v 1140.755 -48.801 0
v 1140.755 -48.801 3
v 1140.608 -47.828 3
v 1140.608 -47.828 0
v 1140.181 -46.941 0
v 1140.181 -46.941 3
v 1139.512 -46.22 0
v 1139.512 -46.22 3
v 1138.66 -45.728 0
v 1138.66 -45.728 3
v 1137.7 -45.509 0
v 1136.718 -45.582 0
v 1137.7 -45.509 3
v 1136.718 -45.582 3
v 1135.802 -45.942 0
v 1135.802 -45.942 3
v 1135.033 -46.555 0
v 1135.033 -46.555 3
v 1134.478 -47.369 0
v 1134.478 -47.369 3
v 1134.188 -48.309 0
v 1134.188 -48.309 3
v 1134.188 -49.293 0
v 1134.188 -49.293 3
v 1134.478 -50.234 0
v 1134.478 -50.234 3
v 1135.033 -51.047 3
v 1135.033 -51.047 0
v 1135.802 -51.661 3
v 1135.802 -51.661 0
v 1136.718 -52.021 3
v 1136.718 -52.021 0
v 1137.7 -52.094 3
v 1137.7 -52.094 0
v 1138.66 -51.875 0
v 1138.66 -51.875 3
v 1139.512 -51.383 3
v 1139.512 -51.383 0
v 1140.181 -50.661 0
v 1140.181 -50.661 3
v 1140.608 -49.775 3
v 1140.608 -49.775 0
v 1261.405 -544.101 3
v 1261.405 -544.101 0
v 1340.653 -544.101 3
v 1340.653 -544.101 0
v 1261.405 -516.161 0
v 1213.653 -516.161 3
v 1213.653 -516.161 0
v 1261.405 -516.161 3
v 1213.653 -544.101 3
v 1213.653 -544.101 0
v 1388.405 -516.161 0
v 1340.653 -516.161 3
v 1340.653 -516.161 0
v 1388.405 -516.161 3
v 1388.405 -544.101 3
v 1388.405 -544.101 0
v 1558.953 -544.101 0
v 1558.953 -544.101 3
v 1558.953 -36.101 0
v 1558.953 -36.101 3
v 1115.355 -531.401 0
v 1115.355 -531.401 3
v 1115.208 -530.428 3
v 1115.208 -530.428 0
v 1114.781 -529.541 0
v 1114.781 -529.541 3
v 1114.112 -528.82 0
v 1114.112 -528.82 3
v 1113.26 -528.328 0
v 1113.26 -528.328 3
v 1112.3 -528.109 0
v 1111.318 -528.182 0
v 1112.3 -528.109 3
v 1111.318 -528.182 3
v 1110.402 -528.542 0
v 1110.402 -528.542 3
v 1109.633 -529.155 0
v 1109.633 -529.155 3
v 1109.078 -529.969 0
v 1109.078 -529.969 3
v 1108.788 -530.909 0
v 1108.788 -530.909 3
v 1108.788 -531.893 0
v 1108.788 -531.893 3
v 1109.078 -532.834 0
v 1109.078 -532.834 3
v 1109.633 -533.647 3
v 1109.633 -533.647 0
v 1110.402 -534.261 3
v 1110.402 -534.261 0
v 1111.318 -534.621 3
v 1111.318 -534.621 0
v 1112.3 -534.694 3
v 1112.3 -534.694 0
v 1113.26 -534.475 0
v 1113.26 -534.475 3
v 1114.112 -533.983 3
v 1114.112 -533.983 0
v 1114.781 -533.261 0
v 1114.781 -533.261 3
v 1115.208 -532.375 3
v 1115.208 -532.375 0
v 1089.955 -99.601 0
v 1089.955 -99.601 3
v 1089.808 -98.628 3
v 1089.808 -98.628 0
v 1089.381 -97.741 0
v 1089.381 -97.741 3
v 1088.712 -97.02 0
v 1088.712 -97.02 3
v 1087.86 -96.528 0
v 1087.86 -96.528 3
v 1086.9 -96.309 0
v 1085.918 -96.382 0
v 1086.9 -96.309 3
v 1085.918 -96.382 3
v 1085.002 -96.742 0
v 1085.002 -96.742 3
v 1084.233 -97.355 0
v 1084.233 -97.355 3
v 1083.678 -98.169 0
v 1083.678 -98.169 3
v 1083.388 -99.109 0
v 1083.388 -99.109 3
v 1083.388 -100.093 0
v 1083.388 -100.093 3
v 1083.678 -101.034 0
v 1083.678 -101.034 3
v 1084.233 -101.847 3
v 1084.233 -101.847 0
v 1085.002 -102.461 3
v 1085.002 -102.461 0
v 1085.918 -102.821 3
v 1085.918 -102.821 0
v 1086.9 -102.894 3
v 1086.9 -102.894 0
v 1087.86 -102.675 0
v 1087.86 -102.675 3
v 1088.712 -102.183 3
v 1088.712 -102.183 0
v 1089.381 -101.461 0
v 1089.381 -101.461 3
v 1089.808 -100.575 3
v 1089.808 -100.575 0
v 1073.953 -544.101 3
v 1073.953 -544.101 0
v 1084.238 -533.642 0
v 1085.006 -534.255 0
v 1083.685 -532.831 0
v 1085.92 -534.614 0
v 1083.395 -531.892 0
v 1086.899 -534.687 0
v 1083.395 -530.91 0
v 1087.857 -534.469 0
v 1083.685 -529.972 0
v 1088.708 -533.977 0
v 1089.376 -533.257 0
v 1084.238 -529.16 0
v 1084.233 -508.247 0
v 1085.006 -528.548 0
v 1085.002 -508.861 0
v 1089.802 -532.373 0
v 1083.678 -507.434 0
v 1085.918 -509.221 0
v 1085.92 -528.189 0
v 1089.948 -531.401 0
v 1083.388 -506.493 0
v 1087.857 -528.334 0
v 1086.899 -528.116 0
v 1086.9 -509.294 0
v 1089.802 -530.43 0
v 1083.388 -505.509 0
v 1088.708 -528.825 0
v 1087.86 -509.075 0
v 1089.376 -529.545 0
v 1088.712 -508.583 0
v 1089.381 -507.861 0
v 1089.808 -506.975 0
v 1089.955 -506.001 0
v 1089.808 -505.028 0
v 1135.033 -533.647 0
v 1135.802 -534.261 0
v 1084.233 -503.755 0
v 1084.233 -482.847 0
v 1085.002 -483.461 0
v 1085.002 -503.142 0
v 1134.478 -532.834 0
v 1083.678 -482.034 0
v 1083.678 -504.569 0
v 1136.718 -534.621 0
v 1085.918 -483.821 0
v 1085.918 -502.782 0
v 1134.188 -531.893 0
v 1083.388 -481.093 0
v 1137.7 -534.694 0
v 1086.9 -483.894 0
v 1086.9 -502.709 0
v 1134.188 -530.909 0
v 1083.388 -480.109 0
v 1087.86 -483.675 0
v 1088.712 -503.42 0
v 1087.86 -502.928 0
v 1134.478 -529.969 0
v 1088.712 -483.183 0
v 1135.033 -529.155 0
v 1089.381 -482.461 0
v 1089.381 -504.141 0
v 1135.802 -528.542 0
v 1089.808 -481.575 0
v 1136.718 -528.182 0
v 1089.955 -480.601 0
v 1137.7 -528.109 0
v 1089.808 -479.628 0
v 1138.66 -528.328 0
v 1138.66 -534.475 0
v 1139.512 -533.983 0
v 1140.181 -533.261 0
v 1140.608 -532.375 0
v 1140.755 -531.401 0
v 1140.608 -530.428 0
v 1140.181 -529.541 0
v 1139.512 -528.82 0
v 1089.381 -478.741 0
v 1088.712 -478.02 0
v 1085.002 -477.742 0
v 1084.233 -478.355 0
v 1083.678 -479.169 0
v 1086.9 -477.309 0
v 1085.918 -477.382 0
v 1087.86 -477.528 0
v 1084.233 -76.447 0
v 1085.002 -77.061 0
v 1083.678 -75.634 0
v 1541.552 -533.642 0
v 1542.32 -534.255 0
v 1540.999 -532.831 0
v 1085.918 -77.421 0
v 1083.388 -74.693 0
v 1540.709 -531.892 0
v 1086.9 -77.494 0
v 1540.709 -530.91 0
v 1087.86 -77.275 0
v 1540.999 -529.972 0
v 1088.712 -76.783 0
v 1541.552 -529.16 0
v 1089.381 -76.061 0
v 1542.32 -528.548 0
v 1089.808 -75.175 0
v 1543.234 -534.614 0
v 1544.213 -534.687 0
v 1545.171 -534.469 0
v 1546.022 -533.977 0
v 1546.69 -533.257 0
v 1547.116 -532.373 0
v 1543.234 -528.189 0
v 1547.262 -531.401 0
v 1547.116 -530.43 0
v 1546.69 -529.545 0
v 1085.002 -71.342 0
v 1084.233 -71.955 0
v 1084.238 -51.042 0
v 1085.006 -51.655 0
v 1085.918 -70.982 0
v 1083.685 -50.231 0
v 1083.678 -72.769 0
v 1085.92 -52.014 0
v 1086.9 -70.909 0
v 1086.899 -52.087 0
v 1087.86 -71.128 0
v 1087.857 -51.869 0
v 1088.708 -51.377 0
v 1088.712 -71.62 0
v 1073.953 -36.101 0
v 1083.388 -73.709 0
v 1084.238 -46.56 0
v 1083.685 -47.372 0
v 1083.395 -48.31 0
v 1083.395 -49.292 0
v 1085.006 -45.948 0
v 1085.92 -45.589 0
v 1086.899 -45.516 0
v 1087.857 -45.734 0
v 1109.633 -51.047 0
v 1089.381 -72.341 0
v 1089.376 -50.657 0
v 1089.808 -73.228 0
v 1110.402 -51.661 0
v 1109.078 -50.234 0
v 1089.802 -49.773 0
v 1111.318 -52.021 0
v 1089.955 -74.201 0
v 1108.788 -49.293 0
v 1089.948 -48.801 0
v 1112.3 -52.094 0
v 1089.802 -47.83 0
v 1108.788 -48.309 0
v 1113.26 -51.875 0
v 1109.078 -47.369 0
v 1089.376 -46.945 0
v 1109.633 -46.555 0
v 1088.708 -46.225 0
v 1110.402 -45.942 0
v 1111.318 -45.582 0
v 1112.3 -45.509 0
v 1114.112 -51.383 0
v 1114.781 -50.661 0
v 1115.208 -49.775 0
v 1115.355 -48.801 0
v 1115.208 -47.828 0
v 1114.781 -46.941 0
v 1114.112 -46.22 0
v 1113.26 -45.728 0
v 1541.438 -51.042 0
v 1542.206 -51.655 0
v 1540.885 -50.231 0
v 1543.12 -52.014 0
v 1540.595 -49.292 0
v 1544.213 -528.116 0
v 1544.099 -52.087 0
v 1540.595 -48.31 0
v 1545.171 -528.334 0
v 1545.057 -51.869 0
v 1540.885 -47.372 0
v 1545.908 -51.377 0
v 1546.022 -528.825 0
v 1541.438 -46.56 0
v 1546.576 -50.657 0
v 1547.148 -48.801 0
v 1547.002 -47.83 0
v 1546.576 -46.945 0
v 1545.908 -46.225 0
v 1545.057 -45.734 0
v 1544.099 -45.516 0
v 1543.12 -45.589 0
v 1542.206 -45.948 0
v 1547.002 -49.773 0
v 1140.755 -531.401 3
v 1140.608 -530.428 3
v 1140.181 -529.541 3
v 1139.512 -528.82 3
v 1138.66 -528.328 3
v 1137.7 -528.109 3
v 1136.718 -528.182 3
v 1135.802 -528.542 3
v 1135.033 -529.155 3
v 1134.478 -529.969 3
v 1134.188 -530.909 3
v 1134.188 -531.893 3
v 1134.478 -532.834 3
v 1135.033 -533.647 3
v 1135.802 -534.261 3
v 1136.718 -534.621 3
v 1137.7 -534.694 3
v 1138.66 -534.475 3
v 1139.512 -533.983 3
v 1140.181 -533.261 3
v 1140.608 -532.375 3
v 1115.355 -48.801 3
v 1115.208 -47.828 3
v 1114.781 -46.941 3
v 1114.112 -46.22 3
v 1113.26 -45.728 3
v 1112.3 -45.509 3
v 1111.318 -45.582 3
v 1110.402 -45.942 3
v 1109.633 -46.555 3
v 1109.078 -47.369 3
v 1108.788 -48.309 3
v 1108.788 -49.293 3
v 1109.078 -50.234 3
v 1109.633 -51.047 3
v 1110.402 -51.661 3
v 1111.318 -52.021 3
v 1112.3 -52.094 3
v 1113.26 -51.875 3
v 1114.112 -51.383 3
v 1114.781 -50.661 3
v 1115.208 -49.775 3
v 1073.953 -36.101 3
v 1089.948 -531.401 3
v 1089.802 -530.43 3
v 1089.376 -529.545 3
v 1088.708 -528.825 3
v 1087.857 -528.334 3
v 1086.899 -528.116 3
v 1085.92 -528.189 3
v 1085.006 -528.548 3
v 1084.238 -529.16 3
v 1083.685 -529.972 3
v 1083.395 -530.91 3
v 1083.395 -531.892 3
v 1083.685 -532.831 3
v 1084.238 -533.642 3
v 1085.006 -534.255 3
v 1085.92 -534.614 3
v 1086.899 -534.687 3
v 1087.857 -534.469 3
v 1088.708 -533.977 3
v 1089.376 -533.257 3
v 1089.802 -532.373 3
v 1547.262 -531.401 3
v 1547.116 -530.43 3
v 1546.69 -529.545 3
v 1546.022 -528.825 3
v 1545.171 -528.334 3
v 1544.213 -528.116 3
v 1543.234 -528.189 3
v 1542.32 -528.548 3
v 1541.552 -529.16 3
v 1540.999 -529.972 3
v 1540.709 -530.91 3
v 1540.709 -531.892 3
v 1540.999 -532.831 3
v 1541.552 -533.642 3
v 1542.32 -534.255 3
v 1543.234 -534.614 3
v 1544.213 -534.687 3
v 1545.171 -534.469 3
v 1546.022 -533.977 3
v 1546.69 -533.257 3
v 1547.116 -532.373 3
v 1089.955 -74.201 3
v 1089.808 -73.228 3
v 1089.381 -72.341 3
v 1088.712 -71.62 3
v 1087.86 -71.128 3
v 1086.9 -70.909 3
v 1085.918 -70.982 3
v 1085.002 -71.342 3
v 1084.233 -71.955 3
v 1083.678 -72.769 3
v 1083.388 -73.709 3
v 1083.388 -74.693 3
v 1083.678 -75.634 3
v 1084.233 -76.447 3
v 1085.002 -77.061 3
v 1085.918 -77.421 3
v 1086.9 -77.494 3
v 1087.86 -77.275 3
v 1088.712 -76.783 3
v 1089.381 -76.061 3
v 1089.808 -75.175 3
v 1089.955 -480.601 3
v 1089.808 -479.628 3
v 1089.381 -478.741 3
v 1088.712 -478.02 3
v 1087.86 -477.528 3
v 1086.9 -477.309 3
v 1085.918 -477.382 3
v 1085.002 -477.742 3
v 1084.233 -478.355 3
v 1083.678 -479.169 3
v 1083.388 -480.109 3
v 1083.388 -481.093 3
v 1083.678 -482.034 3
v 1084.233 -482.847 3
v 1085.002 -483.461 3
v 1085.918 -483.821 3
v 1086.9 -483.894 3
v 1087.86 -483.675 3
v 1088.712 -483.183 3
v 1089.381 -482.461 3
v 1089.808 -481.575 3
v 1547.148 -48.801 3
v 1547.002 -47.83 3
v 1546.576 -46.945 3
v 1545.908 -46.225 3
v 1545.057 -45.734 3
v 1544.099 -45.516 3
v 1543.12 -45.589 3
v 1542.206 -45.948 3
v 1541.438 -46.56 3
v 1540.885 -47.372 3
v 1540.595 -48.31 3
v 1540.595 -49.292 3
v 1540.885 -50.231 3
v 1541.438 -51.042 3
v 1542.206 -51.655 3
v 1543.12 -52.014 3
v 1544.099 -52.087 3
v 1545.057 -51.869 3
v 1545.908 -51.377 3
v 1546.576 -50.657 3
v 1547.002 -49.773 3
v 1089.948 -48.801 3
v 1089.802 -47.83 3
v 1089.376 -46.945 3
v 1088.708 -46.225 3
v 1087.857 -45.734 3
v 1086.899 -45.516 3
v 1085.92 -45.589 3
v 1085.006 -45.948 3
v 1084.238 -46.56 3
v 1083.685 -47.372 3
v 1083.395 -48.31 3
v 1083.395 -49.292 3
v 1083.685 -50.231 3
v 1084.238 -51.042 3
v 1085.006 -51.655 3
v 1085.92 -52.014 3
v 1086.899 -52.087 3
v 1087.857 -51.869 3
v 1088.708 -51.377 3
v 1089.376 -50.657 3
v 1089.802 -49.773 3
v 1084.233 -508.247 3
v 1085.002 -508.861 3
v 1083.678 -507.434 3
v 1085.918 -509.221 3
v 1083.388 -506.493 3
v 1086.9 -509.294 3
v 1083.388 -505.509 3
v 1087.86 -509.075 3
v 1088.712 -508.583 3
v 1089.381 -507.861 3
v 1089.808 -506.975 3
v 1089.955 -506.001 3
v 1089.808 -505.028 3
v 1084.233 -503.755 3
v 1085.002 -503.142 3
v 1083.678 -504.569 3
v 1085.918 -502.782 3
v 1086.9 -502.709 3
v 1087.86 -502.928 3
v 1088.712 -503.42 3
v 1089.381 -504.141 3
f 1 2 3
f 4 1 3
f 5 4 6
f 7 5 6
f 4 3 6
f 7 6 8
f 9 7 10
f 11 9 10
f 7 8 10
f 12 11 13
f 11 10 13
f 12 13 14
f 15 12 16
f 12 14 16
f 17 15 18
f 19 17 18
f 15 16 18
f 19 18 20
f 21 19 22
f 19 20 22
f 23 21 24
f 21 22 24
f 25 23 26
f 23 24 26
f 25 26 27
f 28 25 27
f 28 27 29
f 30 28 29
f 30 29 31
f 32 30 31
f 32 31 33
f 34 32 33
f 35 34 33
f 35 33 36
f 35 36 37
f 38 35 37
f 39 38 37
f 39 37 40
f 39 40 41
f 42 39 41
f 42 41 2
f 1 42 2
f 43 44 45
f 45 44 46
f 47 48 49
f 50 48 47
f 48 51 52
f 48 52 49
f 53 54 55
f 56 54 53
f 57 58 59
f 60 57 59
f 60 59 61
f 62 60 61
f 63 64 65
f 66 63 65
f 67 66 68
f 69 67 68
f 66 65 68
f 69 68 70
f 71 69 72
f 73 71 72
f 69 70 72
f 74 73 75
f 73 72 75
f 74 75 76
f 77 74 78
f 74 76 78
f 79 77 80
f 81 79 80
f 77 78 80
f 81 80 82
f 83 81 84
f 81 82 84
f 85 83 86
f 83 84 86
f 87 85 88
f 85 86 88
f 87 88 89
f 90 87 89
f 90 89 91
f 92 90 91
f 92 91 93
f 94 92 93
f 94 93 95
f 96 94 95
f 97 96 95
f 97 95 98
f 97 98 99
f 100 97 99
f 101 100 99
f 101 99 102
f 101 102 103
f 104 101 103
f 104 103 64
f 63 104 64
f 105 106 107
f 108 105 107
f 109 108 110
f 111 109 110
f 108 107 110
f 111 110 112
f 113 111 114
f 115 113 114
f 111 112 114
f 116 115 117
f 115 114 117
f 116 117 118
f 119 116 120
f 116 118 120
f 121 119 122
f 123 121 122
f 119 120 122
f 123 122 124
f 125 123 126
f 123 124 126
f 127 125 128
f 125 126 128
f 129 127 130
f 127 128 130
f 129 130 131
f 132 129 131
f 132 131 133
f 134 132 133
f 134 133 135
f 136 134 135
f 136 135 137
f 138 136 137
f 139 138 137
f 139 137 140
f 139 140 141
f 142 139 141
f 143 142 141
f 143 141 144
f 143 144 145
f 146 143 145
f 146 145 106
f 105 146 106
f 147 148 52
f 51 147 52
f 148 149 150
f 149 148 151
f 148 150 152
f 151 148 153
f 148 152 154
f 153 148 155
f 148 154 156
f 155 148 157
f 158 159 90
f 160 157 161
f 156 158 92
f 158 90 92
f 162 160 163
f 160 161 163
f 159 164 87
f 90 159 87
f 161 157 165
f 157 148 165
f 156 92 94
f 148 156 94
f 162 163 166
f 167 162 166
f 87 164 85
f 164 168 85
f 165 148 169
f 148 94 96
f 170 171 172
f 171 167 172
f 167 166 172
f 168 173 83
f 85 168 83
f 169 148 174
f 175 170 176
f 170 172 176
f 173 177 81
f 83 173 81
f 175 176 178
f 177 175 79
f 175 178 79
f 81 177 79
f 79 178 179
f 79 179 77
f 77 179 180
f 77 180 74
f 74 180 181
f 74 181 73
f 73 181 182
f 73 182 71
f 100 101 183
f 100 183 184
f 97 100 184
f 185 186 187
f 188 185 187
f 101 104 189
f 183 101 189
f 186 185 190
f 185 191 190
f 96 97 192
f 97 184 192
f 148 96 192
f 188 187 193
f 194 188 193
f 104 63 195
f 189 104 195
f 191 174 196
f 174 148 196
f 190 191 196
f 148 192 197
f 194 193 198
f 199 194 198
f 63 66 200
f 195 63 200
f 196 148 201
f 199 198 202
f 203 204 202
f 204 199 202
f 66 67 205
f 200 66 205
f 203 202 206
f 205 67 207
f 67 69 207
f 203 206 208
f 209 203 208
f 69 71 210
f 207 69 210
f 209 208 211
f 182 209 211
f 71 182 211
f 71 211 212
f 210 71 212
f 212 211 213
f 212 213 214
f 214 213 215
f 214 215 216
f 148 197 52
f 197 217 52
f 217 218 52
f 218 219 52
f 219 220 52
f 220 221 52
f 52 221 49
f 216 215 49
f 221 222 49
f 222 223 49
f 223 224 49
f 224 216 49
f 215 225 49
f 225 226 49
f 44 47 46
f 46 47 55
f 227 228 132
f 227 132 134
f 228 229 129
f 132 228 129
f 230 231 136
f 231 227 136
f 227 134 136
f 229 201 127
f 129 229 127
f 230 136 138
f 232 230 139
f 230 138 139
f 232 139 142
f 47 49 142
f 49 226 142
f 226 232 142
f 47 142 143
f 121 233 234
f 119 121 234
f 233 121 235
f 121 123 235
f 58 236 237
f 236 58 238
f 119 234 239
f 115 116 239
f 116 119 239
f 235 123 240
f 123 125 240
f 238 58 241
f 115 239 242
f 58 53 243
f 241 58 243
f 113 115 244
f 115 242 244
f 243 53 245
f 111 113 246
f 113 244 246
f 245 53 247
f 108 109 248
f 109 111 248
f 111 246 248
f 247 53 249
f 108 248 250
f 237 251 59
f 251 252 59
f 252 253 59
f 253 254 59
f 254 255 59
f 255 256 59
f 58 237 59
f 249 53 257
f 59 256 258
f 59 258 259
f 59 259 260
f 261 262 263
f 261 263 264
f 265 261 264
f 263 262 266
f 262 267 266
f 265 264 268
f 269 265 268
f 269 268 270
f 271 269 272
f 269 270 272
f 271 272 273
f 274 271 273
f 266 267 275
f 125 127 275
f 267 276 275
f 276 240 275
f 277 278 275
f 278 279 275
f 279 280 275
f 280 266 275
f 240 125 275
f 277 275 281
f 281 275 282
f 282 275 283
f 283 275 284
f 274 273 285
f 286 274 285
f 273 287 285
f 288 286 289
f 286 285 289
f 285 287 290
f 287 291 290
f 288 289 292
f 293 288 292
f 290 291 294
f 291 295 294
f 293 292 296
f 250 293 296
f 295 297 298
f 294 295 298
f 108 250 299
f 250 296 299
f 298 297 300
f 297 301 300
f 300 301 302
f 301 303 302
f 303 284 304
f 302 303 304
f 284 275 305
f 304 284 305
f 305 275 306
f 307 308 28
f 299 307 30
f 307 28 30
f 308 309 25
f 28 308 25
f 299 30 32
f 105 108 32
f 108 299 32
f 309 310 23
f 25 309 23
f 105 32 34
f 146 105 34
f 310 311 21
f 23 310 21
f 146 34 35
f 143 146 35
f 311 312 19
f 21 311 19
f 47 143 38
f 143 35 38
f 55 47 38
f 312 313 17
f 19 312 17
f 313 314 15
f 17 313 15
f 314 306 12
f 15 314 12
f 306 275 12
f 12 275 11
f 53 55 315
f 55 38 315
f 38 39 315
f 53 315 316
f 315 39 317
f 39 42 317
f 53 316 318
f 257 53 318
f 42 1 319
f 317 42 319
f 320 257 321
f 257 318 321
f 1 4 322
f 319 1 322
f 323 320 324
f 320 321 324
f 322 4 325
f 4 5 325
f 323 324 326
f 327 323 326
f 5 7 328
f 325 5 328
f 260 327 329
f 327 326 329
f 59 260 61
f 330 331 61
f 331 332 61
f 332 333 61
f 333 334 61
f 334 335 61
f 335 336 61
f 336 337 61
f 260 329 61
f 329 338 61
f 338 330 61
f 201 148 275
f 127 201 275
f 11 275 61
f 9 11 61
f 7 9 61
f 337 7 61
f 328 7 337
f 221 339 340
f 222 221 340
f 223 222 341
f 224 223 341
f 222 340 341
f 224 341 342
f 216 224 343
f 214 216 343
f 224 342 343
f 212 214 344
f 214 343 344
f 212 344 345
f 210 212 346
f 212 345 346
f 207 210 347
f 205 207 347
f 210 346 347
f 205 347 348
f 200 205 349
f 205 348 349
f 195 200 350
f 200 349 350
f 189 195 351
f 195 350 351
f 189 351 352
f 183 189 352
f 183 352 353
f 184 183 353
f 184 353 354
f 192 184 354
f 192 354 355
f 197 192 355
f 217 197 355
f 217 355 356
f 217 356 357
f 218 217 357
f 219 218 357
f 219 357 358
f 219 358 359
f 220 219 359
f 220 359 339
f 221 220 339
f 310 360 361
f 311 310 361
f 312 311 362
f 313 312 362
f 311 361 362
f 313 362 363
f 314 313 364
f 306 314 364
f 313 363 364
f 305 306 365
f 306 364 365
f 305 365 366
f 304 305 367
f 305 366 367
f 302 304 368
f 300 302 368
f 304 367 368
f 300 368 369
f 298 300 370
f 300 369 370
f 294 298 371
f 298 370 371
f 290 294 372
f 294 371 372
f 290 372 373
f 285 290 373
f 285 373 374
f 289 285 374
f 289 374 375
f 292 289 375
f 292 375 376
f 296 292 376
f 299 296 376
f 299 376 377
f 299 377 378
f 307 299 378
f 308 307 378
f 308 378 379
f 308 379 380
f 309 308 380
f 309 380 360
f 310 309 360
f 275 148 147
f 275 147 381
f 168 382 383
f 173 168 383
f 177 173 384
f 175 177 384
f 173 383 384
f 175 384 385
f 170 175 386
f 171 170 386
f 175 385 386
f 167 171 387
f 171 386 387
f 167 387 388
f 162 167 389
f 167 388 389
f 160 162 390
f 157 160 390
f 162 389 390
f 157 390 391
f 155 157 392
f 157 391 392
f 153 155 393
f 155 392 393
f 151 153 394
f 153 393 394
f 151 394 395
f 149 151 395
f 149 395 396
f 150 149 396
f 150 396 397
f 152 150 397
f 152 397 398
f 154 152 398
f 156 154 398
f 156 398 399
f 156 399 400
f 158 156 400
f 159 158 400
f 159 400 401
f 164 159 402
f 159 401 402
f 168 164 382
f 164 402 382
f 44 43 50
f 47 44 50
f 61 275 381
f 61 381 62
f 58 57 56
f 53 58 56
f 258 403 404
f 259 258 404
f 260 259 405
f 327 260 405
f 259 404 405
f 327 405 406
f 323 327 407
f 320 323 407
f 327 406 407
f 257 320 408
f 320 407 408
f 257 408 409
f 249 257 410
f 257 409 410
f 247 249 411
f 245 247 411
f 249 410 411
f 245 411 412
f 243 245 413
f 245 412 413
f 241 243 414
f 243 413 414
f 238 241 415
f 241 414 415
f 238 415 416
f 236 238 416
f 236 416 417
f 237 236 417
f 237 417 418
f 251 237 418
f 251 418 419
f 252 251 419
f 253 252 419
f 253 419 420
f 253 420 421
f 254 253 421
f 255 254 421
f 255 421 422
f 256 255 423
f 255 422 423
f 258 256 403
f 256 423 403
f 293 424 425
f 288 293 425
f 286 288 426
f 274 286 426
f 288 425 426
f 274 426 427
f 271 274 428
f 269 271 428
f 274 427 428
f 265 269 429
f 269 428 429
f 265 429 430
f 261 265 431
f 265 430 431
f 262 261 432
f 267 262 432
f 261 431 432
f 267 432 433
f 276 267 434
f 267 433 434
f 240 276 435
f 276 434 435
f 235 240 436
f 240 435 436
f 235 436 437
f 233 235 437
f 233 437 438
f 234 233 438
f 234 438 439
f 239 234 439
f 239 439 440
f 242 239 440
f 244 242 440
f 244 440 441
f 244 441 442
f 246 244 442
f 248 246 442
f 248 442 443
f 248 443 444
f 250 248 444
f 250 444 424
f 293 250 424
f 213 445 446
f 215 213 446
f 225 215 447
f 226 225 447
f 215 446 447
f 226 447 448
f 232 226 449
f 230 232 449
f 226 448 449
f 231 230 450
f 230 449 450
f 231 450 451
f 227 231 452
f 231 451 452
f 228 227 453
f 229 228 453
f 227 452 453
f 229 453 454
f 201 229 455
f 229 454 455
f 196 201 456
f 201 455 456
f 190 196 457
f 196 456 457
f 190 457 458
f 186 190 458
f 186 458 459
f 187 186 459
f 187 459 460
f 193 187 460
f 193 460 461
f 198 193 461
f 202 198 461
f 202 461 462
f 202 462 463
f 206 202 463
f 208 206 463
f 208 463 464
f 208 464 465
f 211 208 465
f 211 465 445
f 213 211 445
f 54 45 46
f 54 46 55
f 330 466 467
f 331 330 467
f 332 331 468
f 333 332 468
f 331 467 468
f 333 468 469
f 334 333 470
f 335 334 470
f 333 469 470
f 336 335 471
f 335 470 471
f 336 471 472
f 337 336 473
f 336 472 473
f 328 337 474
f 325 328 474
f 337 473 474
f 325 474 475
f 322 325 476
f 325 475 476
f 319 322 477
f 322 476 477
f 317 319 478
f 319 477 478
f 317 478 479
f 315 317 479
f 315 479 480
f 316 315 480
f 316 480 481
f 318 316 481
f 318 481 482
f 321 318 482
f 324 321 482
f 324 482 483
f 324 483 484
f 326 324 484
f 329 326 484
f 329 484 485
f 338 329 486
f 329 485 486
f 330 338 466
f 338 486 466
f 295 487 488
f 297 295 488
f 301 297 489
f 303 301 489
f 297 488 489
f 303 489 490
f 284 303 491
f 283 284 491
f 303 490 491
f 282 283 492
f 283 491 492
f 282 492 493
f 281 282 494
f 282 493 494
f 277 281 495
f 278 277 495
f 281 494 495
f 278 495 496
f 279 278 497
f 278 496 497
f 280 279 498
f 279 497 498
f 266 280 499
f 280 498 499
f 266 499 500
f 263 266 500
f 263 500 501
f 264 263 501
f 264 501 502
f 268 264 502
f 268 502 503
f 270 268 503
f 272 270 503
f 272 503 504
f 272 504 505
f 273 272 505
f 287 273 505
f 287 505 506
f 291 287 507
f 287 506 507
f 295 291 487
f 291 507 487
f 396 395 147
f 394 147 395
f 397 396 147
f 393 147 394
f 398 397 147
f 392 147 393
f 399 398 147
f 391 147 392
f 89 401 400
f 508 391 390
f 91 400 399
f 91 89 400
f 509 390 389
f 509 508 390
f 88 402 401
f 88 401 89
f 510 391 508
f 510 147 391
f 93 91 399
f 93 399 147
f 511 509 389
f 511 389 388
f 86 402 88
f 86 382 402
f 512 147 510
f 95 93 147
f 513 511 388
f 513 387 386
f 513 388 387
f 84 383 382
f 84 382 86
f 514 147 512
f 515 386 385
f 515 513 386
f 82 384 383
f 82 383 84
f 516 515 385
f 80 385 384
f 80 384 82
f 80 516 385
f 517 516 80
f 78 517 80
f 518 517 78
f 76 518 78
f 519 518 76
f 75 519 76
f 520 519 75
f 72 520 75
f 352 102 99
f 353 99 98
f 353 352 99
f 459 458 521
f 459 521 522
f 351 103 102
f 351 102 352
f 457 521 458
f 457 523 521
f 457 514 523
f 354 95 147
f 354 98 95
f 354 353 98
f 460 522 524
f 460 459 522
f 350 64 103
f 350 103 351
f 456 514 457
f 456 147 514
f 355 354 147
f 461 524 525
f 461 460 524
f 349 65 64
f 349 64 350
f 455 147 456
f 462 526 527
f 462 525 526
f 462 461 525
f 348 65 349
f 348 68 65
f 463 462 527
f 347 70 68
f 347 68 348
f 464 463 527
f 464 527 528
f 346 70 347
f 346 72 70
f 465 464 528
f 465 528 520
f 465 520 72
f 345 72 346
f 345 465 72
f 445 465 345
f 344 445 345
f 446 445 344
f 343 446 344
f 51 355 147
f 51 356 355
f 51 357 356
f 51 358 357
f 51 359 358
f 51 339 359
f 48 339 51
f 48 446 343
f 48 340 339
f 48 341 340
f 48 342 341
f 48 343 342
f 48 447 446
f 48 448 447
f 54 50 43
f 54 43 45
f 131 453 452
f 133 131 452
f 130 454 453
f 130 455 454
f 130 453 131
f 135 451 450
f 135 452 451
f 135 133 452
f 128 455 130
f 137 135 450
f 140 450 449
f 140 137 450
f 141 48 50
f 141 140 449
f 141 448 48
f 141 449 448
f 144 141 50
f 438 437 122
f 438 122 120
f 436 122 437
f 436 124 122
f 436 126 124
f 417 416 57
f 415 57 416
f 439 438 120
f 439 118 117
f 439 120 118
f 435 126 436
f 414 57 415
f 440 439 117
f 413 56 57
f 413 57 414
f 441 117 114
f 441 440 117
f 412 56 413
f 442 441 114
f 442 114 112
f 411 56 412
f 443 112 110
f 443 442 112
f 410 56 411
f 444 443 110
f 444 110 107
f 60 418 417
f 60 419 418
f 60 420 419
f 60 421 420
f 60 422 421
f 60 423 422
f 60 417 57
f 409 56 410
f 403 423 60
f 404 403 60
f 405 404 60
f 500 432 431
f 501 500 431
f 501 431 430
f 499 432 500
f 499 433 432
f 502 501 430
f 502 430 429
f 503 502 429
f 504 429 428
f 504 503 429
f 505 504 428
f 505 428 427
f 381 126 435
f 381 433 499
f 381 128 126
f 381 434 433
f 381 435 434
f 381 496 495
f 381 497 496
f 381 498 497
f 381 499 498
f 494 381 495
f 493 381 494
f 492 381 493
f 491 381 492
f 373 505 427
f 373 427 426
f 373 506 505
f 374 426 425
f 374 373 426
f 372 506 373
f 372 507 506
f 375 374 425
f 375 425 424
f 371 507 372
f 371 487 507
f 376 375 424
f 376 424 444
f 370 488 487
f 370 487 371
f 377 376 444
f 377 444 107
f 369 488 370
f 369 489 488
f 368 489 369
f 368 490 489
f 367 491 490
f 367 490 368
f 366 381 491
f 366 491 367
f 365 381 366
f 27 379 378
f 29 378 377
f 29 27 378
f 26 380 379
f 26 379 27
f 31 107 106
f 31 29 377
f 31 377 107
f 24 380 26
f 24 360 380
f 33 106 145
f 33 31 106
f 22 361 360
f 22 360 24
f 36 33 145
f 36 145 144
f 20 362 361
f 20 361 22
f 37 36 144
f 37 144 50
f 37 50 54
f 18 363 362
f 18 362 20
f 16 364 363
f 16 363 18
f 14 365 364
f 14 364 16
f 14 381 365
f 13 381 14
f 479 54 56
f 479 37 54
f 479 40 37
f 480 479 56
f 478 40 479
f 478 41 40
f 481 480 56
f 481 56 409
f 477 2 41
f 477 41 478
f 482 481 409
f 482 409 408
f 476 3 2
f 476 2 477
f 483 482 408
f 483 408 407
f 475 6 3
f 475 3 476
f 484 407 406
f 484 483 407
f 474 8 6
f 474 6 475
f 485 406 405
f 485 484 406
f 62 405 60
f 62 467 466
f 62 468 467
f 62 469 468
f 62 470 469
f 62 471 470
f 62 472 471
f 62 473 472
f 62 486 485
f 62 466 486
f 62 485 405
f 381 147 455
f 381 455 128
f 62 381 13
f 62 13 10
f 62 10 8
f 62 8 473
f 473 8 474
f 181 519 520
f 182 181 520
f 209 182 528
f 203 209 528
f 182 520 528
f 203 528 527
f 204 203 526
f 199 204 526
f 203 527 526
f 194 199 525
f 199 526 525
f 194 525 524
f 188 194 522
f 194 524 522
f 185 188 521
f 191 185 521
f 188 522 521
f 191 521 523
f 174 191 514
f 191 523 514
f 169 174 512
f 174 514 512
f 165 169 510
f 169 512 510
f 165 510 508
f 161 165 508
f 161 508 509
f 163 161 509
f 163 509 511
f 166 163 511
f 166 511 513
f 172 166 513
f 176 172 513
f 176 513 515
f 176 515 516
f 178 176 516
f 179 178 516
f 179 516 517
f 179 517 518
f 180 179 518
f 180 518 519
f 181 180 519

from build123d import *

# Parameters (mm, degrees)
SKETCH1_W           = 485
SKETCH1_H           = 508
BOSS_EXTRUDE1_DEPTH = 3
SKETCH2_R           = 3.295
CUT_EXTRUDE1_DEPTH  = 3
SKETCH3_W           = 47.752
SKETCH3_H           = 27.94
CUT_EXTRUDE2_DEPTH  = 1652.178452636
SKETCH4_R           = 3.302
CUT_EXTRUDE3_DEPTH  = 1652.178452636


with BuildPart() as part:
    # Sketch1 → Boss-Extrude1 (new body)
    with BuildSketch(Plane.XY):
        with Locations((1316.453196618, -290.101289471)):
            Rectangle(SKETCH1_W, SKETCH1_H)
    extrude(amount=BOSS_EXTRUDE1_DEPTH)

    # Sketch2 → Cut-Extrude1 (cut)
    with BuildSketch(Plane.XY.offset(3)):
        with Locations((1086.653196618, -48.801289471)):
            Circle(SKETCH2_R)
        with Locations((1543.853196618, -48.801289471)):
            Circle(SKETCH2_R)
        with Locations((1543.967196618, -531.401289471)):
            Circle(SKETCH2_R)
        with Locations((1086.653196618, -531.401289471)):
            Circle(SKETCH2_R)
    extrude(amount=-CUT_EXTRUDE1_DEPTH, mode=Mode.SUBTRACT)

    # Sketch3 → Cut-Extrude2 (cut, through all)
    with BuildSketch(Plane.XY.offset(3)):
        with Locations((1237.529196618, -530.131289471)):
            Rectangle(SKETCH3_W, SKETCH3_H)
        with Locations((1364.529196618, -530.131289471)):
            Rectangle(SKETCH3_W, SKETCH3_H)
    extrude(amount=-CUT_EXTRUDE2_DEPTH, mode=Mode.SUBTRACT)

    # Sketch4 → Cut-Extrude3 (cut, through all)
    with BuildSketch(Plane.XY.offset(3)):
        with Locations((1112.053196618, -48.801289471)):
            Circle(SKETCH4_R)
        with Locations((1137.453196618, -48.801289471)):
            Circle(SKETCH4_R)
        with Locations((1086.653196618, -74.201289471)):
            Circle(SKETCH4_R)
        with Locations((1086.653196618, -99.601289471)):
            Circle(SKETCH4_R)
        with Locations((1086.653196618, -480.601289471)):
            Circle(SKETCH4_R)
        with Locations((1086.653196618, -506.001289471)):
            Circle(SKETCH4_R)
        with Locations((1112.053196618, -531.401289471)):
            Circle(SKETCH4_R)
        with Locations((1137.453196618, -531.401289471)):
            Circle(SKETCH4_R)
    extrude(amount=-CUT_EXTRUDE3_DEPTH, mode=Mode.SUBTRACT)


solid = part.part
